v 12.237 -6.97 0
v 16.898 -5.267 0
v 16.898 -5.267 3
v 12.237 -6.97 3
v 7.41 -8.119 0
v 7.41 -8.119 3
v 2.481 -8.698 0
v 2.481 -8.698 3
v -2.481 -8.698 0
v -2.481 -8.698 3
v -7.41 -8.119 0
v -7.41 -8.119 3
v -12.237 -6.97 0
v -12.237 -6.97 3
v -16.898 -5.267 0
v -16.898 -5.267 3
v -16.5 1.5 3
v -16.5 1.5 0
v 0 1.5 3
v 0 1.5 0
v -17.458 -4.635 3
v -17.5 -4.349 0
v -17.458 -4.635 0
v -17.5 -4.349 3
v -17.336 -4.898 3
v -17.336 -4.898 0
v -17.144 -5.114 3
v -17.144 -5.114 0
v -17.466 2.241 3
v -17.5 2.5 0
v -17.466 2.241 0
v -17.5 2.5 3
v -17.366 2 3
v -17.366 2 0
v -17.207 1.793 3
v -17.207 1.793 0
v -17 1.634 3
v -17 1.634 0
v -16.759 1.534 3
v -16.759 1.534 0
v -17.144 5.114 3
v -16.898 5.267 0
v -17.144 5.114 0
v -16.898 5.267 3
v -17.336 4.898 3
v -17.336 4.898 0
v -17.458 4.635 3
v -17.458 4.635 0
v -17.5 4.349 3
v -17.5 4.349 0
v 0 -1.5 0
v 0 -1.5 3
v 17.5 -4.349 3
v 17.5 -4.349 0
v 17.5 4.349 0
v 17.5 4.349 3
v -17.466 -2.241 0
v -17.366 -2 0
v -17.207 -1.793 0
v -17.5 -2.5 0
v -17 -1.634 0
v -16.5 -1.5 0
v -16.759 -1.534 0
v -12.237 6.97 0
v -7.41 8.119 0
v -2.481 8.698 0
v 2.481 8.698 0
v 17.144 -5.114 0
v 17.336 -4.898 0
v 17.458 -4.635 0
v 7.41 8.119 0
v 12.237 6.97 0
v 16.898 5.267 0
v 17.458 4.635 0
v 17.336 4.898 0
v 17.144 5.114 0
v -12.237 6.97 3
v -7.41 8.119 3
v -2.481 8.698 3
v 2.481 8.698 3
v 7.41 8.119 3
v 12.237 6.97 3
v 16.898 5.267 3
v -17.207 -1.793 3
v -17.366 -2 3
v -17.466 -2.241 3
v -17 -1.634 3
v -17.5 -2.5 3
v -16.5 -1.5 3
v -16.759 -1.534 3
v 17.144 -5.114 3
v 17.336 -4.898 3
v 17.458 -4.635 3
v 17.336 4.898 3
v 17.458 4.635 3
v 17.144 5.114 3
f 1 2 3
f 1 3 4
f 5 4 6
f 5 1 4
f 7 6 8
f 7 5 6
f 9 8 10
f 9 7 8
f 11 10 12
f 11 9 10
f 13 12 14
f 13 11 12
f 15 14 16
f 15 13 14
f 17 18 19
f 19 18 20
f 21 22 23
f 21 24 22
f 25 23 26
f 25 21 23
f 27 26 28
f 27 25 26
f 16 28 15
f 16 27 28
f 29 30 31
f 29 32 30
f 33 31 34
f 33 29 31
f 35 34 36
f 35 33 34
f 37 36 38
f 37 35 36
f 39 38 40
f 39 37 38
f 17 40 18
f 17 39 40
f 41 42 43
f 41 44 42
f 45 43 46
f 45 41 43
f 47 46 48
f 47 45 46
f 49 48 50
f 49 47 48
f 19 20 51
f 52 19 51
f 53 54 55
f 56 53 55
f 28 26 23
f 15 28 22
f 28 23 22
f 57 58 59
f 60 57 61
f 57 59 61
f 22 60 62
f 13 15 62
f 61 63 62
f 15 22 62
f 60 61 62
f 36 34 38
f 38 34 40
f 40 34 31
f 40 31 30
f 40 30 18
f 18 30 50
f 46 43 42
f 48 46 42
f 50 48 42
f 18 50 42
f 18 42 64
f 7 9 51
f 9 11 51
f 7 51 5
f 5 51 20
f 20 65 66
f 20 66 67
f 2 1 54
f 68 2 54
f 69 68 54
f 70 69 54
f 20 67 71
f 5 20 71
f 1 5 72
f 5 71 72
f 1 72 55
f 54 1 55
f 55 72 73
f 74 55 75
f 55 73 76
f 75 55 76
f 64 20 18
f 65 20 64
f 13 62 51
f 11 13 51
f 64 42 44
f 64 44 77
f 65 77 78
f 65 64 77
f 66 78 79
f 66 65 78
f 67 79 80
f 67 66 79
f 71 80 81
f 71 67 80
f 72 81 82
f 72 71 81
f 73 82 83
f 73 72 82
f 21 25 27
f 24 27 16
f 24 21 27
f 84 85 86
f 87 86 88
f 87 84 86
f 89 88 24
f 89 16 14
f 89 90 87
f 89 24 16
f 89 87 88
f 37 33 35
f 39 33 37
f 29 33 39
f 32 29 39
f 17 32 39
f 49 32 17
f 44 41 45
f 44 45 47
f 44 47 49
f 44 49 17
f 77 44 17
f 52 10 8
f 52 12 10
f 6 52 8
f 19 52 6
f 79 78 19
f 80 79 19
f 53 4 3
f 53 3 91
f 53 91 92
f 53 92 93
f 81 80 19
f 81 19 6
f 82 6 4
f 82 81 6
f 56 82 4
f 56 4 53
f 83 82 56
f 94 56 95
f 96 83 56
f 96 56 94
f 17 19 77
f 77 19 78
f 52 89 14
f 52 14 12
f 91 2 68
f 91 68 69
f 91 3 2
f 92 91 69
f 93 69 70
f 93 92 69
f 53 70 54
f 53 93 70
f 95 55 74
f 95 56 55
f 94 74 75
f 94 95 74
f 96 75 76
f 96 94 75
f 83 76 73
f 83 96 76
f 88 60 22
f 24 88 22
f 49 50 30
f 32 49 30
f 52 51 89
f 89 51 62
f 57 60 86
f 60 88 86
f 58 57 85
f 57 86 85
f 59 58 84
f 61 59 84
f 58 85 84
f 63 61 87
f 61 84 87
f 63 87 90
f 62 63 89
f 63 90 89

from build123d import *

# Parameters (mm, degrees)
EXTRUDE_1_DEPTH = 3
FILLET_1_R      = 1


with BuildPart() as part:
    # Эскиз1 → Бобышка-Вытянуть1 (new body)
    with BuildSketch(Plane.XY):
        Polygon((-17.5, -1.5), (-17.5, -5), (17.5, -5), (17.5, 5), (-17.5, 5), (-17.5, 1.5), (0, 1.5), (0, -1.5), align=None)
        with BuildLine():
            ThreePointArc((-17.5, 5), (0, 8.770166538), (17.5, 5))
            Line((17.5, 5), (-17.5, 5))
        make_face()
        with BuildLine():
            Line((-17.5, -5), (17.5, -5))
            ThreePointArc((17.5, -5), (0, -8.770166538), (-17.5, -5))
        make_face()
    extrude(amount=EXTRUDE_1_DEPTH)

    # Скругление1
    fillet_1_edges = [part.edges().sort_by_distance(p)[0] for p in [
        (-17.5, 1.5, 1.5),
        (-17.5, 5, 1.5),
        (17.5, 5, 1.5),
        (17.5, -5, 1.5),
        (-17.5, -5, 1.5),
        (-17.5, -1.5, 1.5),
    ]]
    fillet(fillet_1_edges, radius=FILLET_1_R)


solid = part.part
